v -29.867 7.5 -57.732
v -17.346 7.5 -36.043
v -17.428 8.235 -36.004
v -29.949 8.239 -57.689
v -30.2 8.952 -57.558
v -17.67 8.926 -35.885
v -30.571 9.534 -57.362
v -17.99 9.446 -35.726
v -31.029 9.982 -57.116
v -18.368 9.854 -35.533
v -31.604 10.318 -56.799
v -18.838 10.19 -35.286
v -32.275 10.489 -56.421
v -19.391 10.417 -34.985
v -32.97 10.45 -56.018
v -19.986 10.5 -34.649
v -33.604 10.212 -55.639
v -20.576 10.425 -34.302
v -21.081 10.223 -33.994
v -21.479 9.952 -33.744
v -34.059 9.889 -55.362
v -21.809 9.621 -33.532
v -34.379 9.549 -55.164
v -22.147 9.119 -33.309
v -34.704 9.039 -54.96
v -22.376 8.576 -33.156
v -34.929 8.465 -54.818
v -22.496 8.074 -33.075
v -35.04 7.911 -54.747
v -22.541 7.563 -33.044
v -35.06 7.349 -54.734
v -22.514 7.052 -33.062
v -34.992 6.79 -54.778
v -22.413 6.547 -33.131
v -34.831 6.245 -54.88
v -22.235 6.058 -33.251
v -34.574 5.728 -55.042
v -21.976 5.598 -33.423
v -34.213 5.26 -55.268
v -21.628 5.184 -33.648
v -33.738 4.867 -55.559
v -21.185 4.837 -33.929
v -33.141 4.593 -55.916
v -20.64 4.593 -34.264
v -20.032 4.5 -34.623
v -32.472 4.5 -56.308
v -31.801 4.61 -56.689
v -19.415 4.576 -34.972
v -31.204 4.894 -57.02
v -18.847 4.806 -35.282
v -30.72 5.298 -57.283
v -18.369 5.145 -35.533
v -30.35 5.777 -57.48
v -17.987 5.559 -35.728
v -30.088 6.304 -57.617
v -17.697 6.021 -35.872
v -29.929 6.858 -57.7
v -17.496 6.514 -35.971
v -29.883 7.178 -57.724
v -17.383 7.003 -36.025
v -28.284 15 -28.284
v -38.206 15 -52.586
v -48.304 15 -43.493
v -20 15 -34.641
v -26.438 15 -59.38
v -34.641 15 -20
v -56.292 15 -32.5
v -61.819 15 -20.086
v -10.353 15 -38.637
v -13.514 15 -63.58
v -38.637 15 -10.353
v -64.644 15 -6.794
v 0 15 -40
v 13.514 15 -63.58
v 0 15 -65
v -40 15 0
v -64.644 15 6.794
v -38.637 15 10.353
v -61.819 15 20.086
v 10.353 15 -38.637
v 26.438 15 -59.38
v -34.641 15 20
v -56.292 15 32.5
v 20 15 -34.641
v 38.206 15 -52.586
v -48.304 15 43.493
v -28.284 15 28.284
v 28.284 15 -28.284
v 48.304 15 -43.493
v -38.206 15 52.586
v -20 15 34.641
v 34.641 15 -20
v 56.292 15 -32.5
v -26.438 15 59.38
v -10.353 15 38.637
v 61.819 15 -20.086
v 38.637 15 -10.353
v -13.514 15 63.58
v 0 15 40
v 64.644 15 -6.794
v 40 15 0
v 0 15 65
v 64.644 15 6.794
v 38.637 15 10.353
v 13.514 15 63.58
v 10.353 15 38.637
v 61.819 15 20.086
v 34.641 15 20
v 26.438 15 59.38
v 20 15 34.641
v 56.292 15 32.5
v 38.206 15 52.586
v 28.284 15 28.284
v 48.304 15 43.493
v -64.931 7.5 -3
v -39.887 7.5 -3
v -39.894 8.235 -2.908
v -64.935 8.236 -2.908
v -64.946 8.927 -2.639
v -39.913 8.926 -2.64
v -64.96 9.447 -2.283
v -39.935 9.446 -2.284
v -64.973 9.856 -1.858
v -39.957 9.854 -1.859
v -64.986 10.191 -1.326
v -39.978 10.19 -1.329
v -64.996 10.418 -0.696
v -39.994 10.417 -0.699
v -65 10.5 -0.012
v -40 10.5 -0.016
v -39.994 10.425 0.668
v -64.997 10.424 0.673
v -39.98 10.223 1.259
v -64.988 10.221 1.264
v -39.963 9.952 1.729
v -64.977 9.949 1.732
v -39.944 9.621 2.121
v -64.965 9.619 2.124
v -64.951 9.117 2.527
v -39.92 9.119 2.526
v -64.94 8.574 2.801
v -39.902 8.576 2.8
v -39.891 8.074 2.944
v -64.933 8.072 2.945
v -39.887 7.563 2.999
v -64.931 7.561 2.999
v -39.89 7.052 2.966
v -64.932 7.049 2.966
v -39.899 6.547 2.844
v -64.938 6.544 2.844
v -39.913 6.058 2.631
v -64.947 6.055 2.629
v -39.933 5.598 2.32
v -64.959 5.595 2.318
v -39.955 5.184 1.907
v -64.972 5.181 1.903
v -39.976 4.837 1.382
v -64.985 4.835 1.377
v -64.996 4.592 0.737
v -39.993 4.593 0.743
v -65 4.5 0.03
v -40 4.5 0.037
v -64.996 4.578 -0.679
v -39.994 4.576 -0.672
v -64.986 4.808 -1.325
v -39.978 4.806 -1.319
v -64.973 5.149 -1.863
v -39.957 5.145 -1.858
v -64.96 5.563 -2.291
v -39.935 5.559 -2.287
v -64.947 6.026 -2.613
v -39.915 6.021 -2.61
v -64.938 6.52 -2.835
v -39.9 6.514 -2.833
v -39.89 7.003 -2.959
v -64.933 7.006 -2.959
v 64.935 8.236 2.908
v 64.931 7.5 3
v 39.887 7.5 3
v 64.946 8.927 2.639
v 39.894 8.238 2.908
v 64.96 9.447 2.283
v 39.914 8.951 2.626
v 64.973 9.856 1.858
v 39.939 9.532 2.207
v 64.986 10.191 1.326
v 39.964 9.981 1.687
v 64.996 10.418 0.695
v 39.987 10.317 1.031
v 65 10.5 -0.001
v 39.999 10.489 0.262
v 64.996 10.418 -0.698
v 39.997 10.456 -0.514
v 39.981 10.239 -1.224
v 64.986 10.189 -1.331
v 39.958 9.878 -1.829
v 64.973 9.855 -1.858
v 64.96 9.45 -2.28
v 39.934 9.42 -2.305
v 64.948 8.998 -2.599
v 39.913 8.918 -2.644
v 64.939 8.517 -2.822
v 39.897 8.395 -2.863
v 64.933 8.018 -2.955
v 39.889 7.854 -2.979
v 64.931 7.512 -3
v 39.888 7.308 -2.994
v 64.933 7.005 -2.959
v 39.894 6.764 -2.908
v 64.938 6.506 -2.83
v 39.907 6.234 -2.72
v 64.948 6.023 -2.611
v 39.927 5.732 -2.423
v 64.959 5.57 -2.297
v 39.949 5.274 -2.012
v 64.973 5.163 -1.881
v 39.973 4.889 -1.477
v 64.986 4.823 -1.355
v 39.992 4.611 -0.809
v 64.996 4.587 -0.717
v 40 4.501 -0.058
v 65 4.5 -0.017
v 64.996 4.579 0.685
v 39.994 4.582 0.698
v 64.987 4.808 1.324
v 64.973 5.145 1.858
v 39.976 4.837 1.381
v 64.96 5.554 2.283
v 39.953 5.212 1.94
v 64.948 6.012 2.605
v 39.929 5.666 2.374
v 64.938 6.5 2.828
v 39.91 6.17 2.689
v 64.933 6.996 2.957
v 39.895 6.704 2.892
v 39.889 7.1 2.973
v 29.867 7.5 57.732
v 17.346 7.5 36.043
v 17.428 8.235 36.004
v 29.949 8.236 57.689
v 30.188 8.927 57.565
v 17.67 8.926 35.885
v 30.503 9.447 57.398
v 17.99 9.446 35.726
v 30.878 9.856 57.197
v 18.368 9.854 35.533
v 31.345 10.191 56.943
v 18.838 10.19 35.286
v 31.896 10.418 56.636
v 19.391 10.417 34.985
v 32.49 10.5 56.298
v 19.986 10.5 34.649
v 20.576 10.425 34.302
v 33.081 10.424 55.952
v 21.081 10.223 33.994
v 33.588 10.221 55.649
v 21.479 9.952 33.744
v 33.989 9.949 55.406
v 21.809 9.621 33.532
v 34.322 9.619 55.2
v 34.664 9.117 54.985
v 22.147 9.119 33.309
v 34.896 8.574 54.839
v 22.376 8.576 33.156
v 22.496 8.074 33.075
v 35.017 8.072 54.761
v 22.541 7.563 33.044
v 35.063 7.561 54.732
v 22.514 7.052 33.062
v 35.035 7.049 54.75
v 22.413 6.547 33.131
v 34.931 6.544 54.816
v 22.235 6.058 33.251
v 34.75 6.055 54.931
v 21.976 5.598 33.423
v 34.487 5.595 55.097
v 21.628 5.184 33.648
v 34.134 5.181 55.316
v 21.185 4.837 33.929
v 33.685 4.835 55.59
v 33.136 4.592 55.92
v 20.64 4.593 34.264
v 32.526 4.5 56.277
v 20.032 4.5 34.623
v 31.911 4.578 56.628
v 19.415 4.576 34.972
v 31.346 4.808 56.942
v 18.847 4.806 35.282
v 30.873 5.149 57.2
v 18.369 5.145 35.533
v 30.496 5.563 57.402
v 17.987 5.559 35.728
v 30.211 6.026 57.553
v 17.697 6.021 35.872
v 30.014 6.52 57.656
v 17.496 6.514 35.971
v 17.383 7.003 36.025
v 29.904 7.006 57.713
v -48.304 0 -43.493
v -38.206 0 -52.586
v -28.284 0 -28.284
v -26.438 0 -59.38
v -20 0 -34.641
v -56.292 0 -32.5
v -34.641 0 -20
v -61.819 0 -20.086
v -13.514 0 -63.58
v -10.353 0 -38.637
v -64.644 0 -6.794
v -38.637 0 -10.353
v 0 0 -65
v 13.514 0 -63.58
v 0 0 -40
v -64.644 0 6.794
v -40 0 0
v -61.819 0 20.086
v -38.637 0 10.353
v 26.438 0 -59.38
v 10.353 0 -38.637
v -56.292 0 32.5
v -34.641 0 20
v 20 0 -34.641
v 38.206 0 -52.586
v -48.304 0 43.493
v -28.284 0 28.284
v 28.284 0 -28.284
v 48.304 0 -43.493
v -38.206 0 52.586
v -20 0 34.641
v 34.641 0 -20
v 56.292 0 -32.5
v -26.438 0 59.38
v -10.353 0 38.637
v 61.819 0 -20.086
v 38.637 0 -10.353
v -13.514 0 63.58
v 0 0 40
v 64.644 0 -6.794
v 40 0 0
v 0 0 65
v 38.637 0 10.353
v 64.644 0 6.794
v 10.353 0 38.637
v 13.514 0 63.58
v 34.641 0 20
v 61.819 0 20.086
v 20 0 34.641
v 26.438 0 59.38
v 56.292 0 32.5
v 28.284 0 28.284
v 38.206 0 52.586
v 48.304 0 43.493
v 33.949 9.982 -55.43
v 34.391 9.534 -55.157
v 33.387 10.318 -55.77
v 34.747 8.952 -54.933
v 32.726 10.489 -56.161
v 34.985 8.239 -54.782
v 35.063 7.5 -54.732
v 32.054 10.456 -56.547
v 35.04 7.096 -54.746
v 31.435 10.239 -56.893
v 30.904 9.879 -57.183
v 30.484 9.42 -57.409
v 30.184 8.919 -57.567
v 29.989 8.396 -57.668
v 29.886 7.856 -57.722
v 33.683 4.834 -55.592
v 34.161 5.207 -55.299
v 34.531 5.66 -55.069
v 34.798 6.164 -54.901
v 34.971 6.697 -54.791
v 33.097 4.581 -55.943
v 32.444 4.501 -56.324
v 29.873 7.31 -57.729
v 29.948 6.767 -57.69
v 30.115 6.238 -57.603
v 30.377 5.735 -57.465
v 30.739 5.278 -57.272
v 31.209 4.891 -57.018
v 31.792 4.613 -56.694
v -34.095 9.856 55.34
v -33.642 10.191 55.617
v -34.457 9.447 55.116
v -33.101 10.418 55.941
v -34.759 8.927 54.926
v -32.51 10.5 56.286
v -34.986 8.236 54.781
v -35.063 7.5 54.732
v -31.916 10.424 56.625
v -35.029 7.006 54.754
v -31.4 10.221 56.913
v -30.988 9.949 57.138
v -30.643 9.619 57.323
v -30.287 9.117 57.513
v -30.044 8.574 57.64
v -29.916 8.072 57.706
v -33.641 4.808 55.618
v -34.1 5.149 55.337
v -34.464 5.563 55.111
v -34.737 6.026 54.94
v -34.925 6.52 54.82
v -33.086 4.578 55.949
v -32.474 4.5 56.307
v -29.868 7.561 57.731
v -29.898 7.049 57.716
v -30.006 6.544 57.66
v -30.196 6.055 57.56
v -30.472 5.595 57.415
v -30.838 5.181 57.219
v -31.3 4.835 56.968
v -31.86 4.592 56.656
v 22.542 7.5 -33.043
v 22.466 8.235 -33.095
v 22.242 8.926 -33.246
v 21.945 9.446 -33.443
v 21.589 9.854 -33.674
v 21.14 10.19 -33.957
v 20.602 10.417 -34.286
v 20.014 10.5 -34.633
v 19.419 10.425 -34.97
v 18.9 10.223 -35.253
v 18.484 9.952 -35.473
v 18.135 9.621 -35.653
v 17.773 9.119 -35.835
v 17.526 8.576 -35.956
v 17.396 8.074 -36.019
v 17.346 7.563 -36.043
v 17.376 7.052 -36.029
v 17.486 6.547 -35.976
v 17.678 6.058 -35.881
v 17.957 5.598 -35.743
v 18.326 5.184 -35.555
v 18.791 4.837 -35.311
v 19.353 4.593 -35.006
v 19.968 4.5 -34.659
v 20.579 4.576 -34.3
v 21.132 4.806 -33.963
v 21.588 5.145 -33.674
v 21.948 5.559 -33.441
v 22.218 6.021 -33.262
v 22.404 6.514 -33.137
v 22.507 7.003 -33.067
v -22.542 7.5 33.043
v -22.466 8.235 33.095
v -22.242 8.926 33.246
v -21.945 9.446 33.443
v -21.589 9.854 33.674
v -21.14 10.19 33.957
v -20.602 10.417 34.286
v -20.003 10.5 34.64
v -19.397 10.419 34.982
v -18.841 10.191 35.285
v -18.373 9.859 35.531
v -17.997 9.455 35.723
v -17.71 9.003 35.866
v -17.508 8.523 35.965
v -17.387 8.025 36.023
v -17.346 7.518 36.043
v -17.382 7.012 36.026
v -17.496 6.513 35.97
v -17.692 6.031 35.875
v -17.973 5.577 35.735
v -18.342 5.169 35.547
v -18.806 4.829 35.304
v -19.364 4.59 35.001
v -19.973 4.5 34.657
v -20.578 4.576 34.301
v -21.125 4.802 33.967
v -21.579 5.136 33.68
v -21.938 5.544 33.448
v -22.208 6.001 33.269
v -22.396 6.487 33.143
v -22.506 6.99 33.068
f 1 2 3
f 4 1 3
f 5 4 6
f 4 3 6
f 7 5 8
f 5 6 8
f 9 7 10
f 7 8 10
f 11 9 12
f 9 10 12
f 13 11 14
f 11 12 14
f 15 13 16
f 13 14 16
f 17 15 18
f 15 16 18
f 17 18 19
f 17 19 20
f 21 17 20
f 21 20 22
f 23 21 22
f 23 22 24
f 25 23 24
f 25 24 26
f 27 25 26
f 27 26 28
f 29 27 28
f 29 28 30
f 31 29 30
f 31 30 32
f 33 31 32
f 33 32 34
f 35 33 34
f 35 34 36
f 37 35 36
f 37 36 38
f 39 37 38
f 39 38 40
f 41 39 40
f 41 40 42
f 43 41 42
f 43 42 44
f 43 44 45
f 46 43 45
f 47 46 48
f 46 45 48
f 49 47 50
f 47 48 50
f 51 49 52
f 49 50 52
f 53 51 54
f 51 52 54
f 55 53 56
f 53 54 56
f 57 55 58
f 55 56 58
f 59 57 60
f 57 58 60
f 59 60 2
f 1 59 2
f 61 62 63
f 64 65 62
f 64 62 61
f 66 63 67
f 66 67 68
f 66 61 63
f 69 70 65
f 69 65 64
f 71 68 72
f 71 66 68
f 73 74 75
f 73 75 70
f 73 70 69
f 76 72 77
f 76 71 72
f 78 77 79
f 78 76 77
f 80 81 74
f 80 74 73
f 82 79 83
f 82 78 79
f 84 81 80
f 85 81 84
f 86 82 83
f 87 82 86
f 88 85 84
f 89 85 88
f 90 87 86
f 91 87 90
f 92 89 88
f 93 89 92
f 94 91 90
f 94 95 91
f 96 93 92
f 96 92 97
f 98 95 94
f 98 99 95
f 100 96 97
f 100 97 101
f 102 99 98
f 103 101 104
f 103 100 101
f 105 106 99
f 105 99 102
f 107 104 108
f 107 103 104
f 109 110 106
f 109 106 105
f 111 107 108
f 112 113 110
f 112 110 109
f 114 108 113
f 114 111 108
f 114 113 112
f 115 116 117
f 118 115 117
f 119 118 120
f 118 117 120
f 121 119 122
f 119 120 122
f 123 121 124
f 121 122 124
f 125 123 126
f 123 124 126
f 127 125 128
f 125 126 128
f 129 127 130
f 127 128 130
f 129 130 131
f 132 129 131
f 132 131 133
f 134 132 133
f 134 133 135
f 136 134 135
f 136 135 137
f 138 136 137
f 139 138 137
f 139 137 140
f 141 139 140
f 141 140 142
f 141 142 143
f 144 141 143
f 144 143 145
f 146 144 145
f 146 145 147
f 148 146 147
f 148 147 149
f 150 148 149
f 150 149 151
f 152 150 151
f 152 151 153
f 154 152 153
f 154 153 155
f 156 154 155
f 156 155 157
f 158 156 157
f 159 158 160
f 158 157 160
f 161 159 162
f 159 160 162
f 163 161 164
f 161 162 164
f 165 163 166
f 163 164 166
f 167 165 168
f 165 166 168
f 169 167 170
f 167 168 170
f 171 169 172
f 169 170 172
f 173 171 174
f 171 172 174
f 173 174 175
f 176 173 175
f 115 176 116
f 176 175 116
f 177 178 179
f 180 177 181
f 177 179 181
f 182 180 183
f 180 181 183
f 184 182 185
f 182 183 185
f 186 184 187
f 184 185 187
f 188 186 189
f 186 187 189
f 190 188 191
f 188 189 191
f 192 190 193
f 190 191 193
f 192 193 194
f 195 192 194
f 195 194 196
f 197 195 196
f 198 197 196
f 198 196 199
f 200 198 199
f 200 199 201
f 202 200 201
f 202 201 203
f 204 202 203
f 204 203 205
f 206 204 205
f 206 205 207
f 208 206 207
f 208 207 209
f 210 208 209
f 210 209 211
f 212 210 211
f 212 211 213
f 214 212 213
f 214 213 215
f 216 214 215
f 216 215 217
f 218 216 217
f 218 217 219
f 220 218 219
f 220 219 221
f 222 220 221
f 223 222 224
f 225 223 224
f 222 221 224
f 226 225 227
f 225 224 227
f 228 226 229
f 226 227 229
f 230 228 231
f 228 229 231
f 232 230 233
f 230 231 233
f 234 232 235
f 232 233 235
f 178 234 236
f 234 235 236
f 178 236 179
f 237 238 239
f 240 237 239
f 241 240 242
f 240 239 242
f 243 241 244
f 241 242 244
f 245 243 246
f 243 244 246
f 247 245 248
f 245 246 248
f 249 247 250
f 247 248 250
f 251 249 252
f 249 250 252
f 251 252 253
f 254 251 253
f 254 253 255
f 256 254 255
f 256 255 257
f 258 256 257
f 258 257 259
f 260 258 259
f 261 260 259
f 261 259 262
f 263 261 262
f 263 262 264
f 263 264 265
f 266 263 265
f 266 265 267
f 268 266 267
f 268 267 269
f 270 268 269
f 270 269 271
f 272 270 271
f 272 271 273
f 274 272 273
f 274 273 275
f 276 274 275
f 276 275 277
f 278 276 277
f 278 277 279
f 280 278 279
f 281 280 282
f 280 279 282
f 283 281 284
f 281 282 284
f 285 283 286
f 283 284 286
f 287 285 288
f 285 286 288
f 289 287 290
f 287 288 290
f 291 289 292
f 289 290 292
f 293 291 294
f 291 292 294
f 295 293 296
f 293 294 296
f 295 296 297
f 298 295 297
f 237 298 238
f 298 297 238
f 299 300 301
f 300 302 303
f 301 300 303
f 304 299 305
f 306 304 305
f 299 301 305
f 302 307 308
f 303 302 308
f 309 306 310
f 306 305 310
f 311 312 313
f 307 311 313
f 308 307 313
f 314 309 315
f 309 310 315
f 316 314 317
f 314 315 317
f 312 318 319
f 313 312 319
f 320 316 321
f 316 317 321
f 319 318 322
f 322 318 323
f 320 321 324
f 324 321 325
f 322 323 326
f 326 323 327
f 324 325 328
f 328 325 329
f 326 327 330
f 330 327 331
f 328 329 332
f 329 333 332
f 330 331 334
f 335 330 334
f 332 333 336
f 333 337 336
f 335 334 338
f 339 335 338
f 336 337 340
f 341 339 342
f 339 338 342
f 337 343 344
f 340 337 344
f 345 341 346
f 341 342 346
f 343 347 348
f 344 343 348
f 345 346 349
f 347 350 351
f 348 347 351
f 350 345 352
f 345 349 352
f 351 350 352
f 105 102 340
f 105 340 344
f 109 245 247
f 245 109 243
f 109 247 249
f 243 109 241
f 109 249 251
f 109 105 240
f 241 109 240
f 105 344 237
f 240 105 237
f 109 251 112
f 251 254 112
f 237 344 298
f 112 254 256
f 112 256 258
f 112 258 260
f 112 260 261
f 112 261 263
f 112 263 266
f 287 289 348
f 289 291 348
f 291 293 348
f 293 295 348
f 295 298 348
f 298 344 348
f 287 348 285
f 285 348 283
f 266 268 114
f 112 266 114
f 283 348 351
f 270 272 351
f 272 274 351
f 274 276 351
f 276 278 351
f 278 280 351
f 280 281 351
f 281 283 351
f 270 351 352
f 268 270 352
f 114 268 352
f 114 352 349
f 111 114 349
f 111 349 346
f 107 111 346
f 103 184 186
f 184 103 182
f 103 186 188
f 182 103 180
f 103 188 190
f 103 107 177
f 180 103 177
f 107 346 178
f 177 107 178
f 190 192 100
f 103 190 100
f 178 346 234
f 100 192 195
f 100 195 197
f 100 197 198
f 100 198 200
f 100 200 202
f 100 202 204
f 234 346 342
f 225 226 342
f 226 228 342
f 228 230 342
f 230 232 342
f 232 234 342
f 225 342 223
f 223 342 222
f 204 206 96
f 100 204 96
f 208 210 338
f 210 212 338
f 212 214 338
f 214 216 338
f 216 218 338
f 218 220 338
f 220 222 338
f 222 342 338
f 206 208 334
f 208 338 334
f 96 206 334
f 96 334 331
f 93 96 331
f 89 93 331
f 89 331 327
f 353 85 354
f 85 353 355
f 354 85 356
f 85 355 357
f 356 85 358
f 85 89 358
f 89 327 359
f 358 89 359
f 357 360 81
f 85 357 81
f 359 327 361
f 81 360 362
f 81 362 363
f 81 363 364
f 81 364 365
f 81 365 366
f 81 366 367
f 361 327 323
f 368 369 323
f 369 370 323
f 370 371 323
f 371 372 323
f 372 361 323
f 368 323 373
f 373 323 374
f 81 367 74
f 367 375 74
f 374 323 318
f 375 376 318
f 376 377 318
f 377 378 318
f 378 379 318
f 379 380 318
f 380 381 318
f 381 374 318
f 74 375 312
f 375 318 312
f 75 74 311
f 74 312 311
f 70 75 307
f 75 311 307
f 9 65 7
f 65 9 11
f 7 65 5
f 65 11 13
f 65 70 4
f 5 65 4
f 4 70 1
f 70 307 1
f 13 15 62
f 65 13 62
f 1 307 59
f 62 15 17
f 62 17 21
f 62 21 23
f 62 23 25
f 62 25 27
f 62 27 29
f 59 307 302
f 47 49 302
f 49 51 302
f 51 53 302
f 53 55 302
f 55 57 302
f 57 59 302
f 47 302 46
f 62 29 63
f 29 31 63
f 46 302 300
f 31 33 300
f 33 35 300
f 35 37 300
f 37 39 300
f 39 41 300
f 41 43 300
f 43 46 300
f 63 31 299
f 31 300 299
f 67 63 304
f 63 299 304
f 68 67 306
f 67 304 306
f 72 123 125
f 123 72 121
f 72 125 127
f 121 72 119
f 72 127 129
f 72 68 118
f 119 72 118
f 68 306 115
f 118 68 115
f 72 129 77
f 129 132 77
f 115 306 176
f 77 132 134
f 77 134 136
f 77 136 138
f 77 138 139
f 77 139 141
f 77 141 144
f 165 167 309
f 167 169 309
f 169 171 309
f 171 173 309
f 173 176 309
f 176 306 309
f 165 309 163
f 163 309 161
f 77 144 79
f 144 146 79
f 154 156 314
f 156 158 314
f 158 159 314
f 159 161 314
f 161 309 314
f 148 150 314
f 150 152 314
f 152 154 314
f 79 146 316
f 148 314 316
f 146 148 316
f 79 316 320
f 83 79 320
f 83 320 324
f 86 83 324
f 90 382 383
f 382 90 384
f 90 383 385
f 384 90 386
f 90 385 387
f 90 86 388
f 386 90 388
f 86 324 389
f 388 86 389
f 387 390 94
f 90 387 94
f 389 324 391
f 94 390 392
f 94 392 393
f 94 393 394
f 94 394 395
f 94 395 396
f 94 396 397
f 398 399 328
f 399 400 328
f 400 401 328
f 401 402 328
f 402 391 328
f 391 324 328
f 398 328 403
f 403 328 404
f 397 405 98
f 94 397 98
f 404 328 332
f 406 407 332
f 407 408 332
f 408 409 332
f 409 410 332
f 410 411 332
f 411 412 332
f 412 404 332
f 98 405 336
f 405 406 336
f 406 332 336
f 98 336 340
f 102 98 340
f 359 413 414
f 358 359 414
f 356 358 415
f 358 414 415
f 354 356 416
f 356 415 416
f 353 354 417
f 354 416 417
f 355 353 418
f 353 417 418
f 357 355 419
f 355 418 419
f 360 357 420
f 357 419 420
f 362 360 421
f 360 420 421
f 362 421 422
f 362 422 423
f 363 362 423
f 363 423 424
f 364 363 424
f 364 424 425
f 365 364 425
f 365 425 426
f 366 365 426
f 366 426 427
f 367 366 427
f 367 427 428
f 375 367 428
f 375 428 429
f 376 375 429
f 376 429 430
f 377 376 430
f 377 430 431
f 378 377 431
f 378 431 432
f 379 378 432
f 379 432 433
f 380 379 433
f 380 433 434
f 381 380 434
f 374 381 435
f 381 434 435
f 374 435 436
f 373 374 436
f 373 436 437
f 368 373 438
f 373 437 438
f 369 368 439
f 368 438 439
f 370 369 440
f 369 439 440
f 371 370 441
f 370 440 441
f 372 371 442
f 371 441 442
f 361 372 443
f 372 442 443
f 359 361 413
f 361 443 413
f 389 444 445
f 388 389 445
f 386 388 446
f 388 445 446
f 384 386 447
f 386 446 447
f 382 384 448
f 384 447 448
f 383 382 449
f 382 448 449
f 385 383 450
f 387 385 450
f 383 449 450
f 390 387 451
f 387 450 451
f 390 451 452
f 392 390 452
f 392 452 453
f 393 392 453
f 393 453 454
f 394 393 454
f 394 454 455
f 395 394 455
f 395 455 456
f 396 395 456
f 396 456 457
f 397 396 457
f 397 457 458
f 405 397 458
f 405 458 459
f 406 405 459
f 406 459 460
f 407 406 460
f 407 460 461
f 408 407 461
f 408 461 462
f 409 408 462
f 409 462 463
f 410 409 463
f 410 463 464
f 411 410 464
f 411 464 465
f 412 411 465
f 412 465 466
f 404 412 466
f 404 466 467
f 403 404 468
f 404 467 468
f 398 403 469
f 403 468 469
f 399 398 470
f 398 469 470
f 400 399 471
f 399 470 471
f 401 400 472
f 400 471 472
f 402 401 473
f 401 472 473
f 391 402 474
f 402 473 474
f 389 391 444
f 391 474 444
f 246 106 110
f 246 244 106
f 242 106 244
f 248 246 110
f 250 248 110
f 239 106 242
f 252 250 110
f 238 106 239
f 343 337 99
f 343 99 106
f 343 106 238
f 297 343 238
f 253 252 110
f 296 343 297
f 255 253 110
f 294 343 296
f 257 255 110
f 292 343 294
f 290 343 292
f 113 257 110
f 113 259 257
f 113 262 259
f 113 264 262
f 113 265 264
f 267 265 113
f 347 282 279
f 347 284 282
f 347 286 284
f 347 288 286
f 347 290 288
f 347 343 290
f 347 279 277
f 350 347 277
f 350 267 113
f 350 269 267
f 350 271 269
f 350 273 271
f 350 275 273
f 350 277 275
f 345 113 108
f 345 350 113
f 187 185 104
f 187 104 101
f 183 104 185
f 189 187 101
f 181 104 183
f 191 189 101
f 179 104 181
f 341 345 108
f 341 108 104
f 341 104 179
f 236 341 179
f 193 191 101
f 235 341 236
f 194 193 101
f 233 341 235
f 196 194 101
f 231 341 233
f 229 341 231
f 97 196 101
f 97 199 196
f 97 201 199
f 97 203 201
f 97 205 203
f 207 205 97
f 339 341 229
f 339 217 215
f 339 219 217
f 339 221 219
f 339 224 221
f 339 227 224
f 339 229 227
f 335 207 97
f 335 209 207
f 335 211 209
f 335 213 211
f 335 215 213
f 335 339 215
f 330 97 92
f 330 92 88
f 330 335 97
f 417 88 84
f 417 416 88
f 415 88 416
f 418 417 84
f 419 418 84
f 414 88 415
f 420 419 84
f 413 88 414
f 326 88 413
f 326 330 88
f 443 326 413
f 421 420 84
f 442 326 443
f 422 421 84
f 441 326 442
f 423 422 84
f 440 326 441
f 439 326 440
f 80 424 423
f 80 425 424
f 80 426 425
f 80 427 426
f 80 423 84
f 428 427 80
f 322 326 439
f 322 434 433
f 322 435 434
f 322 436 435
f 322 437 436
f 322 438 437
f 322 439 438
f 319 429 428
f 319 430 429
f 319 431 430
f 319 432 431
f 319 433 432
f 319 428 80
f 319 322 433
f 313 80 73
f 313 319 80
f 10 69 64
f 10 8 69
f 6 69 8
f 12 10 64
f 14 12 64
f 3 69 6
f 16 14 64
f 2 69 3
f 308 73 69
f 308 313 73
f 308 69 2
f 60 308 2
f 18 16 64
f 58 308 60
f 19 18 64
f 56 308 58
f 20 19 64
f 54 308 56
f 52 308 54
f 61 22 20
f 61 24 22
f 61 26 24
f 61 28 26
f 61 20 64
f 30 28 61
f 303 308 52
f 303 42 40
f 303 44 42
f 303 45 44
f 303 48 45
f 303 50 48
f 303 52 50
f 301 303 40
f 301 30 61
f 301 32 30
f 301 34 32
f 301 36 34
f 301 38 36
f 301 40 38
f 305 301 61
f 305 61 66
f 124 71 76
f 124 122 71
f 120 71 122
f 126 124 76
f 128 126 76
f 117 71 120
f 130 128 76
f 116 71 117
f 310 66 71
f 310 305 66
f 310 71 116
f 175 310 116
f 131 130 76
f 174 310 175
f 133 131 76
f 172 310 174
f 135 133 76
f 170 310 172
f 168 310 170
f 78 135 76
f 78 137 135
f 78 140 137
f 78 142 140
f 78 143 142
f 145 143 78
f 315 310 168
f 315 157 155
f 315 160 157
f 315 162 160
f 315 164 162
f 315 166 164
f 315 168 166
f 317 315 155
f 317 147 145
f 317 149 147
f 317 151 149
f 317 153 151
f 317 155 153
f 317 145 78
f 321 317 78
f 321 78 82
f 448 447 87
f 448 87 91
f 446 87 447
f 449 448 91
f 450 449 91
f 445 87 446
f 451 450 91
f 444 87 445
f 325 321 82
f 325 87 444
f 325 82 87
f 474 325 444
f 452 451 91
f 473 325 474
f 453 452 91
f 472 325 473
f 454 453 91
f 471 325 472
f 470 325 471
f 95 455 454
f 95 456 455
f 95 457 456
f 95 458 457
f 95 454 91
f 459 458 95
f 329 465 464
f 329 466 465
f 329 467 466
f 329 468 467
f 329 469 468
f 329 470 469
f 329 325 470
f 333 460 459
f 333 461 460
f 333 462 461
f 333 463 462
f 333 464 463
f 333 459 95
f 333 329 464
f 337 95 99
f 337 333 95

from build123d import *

# Parameters (mm, degrees)
SKETCH1_R           = 65
SKETCH1_R_2         = 40
BOSS_EXTRUDE1_DEPTH = 15
SKETCH2_R           = 3
CUT_EXTRUDE1_DEPTH  = 94.139680051
CIRPATTERN1_COUNT   = 6


with BuildPart() as part:
    # Sketch1 → Boss-Extrude1 (new body)
    with BuildSketch(Plane(origin=(0, 0, 0), x_dir=(1, 0, 0), z_dir=(0, 1, 0))):
        with Locations(Location((0, 0, 0), (0, 0, 270))):
            Circle(SKETCH1_R)
        with Locations(Location((0, 0, 0), (0, 0, 270))):
            Circle(SKETCH1_R_2, mode=Mode.SUBTRACT)
    extrude(amount=BOSS_EXTRUDE1_DEPTH)

    # Sketch2 → Cut-Extrude1 (cut, through all)
    with BuildSketch(Plane(origin=(0, 0, 0), x_dir=(0, 0, -1), z_dir=(1, 0, 0))):
        with Locations((0, 7.5)):
            Circle(SKETCH2_R)
    cut_extrude1 = extrude(amount=-CUT_EXTRUDE1_DEPTH, mode=Mode.SUBTRACT)

    # CirPattern1: Cut-Extrude1 ×6 about axis
    cirpattern1_axis = Axis((0, 15, 0), (0, 1, 0))
    for i in range(1, CIRPATTERN1_COUNT):
        add(cut_extrude1.rotate(cirpattern1_axis, i * 360 / CIRPATTERN1_COUNT), mode=Mode.SUBTRACT)


solid = part.part
